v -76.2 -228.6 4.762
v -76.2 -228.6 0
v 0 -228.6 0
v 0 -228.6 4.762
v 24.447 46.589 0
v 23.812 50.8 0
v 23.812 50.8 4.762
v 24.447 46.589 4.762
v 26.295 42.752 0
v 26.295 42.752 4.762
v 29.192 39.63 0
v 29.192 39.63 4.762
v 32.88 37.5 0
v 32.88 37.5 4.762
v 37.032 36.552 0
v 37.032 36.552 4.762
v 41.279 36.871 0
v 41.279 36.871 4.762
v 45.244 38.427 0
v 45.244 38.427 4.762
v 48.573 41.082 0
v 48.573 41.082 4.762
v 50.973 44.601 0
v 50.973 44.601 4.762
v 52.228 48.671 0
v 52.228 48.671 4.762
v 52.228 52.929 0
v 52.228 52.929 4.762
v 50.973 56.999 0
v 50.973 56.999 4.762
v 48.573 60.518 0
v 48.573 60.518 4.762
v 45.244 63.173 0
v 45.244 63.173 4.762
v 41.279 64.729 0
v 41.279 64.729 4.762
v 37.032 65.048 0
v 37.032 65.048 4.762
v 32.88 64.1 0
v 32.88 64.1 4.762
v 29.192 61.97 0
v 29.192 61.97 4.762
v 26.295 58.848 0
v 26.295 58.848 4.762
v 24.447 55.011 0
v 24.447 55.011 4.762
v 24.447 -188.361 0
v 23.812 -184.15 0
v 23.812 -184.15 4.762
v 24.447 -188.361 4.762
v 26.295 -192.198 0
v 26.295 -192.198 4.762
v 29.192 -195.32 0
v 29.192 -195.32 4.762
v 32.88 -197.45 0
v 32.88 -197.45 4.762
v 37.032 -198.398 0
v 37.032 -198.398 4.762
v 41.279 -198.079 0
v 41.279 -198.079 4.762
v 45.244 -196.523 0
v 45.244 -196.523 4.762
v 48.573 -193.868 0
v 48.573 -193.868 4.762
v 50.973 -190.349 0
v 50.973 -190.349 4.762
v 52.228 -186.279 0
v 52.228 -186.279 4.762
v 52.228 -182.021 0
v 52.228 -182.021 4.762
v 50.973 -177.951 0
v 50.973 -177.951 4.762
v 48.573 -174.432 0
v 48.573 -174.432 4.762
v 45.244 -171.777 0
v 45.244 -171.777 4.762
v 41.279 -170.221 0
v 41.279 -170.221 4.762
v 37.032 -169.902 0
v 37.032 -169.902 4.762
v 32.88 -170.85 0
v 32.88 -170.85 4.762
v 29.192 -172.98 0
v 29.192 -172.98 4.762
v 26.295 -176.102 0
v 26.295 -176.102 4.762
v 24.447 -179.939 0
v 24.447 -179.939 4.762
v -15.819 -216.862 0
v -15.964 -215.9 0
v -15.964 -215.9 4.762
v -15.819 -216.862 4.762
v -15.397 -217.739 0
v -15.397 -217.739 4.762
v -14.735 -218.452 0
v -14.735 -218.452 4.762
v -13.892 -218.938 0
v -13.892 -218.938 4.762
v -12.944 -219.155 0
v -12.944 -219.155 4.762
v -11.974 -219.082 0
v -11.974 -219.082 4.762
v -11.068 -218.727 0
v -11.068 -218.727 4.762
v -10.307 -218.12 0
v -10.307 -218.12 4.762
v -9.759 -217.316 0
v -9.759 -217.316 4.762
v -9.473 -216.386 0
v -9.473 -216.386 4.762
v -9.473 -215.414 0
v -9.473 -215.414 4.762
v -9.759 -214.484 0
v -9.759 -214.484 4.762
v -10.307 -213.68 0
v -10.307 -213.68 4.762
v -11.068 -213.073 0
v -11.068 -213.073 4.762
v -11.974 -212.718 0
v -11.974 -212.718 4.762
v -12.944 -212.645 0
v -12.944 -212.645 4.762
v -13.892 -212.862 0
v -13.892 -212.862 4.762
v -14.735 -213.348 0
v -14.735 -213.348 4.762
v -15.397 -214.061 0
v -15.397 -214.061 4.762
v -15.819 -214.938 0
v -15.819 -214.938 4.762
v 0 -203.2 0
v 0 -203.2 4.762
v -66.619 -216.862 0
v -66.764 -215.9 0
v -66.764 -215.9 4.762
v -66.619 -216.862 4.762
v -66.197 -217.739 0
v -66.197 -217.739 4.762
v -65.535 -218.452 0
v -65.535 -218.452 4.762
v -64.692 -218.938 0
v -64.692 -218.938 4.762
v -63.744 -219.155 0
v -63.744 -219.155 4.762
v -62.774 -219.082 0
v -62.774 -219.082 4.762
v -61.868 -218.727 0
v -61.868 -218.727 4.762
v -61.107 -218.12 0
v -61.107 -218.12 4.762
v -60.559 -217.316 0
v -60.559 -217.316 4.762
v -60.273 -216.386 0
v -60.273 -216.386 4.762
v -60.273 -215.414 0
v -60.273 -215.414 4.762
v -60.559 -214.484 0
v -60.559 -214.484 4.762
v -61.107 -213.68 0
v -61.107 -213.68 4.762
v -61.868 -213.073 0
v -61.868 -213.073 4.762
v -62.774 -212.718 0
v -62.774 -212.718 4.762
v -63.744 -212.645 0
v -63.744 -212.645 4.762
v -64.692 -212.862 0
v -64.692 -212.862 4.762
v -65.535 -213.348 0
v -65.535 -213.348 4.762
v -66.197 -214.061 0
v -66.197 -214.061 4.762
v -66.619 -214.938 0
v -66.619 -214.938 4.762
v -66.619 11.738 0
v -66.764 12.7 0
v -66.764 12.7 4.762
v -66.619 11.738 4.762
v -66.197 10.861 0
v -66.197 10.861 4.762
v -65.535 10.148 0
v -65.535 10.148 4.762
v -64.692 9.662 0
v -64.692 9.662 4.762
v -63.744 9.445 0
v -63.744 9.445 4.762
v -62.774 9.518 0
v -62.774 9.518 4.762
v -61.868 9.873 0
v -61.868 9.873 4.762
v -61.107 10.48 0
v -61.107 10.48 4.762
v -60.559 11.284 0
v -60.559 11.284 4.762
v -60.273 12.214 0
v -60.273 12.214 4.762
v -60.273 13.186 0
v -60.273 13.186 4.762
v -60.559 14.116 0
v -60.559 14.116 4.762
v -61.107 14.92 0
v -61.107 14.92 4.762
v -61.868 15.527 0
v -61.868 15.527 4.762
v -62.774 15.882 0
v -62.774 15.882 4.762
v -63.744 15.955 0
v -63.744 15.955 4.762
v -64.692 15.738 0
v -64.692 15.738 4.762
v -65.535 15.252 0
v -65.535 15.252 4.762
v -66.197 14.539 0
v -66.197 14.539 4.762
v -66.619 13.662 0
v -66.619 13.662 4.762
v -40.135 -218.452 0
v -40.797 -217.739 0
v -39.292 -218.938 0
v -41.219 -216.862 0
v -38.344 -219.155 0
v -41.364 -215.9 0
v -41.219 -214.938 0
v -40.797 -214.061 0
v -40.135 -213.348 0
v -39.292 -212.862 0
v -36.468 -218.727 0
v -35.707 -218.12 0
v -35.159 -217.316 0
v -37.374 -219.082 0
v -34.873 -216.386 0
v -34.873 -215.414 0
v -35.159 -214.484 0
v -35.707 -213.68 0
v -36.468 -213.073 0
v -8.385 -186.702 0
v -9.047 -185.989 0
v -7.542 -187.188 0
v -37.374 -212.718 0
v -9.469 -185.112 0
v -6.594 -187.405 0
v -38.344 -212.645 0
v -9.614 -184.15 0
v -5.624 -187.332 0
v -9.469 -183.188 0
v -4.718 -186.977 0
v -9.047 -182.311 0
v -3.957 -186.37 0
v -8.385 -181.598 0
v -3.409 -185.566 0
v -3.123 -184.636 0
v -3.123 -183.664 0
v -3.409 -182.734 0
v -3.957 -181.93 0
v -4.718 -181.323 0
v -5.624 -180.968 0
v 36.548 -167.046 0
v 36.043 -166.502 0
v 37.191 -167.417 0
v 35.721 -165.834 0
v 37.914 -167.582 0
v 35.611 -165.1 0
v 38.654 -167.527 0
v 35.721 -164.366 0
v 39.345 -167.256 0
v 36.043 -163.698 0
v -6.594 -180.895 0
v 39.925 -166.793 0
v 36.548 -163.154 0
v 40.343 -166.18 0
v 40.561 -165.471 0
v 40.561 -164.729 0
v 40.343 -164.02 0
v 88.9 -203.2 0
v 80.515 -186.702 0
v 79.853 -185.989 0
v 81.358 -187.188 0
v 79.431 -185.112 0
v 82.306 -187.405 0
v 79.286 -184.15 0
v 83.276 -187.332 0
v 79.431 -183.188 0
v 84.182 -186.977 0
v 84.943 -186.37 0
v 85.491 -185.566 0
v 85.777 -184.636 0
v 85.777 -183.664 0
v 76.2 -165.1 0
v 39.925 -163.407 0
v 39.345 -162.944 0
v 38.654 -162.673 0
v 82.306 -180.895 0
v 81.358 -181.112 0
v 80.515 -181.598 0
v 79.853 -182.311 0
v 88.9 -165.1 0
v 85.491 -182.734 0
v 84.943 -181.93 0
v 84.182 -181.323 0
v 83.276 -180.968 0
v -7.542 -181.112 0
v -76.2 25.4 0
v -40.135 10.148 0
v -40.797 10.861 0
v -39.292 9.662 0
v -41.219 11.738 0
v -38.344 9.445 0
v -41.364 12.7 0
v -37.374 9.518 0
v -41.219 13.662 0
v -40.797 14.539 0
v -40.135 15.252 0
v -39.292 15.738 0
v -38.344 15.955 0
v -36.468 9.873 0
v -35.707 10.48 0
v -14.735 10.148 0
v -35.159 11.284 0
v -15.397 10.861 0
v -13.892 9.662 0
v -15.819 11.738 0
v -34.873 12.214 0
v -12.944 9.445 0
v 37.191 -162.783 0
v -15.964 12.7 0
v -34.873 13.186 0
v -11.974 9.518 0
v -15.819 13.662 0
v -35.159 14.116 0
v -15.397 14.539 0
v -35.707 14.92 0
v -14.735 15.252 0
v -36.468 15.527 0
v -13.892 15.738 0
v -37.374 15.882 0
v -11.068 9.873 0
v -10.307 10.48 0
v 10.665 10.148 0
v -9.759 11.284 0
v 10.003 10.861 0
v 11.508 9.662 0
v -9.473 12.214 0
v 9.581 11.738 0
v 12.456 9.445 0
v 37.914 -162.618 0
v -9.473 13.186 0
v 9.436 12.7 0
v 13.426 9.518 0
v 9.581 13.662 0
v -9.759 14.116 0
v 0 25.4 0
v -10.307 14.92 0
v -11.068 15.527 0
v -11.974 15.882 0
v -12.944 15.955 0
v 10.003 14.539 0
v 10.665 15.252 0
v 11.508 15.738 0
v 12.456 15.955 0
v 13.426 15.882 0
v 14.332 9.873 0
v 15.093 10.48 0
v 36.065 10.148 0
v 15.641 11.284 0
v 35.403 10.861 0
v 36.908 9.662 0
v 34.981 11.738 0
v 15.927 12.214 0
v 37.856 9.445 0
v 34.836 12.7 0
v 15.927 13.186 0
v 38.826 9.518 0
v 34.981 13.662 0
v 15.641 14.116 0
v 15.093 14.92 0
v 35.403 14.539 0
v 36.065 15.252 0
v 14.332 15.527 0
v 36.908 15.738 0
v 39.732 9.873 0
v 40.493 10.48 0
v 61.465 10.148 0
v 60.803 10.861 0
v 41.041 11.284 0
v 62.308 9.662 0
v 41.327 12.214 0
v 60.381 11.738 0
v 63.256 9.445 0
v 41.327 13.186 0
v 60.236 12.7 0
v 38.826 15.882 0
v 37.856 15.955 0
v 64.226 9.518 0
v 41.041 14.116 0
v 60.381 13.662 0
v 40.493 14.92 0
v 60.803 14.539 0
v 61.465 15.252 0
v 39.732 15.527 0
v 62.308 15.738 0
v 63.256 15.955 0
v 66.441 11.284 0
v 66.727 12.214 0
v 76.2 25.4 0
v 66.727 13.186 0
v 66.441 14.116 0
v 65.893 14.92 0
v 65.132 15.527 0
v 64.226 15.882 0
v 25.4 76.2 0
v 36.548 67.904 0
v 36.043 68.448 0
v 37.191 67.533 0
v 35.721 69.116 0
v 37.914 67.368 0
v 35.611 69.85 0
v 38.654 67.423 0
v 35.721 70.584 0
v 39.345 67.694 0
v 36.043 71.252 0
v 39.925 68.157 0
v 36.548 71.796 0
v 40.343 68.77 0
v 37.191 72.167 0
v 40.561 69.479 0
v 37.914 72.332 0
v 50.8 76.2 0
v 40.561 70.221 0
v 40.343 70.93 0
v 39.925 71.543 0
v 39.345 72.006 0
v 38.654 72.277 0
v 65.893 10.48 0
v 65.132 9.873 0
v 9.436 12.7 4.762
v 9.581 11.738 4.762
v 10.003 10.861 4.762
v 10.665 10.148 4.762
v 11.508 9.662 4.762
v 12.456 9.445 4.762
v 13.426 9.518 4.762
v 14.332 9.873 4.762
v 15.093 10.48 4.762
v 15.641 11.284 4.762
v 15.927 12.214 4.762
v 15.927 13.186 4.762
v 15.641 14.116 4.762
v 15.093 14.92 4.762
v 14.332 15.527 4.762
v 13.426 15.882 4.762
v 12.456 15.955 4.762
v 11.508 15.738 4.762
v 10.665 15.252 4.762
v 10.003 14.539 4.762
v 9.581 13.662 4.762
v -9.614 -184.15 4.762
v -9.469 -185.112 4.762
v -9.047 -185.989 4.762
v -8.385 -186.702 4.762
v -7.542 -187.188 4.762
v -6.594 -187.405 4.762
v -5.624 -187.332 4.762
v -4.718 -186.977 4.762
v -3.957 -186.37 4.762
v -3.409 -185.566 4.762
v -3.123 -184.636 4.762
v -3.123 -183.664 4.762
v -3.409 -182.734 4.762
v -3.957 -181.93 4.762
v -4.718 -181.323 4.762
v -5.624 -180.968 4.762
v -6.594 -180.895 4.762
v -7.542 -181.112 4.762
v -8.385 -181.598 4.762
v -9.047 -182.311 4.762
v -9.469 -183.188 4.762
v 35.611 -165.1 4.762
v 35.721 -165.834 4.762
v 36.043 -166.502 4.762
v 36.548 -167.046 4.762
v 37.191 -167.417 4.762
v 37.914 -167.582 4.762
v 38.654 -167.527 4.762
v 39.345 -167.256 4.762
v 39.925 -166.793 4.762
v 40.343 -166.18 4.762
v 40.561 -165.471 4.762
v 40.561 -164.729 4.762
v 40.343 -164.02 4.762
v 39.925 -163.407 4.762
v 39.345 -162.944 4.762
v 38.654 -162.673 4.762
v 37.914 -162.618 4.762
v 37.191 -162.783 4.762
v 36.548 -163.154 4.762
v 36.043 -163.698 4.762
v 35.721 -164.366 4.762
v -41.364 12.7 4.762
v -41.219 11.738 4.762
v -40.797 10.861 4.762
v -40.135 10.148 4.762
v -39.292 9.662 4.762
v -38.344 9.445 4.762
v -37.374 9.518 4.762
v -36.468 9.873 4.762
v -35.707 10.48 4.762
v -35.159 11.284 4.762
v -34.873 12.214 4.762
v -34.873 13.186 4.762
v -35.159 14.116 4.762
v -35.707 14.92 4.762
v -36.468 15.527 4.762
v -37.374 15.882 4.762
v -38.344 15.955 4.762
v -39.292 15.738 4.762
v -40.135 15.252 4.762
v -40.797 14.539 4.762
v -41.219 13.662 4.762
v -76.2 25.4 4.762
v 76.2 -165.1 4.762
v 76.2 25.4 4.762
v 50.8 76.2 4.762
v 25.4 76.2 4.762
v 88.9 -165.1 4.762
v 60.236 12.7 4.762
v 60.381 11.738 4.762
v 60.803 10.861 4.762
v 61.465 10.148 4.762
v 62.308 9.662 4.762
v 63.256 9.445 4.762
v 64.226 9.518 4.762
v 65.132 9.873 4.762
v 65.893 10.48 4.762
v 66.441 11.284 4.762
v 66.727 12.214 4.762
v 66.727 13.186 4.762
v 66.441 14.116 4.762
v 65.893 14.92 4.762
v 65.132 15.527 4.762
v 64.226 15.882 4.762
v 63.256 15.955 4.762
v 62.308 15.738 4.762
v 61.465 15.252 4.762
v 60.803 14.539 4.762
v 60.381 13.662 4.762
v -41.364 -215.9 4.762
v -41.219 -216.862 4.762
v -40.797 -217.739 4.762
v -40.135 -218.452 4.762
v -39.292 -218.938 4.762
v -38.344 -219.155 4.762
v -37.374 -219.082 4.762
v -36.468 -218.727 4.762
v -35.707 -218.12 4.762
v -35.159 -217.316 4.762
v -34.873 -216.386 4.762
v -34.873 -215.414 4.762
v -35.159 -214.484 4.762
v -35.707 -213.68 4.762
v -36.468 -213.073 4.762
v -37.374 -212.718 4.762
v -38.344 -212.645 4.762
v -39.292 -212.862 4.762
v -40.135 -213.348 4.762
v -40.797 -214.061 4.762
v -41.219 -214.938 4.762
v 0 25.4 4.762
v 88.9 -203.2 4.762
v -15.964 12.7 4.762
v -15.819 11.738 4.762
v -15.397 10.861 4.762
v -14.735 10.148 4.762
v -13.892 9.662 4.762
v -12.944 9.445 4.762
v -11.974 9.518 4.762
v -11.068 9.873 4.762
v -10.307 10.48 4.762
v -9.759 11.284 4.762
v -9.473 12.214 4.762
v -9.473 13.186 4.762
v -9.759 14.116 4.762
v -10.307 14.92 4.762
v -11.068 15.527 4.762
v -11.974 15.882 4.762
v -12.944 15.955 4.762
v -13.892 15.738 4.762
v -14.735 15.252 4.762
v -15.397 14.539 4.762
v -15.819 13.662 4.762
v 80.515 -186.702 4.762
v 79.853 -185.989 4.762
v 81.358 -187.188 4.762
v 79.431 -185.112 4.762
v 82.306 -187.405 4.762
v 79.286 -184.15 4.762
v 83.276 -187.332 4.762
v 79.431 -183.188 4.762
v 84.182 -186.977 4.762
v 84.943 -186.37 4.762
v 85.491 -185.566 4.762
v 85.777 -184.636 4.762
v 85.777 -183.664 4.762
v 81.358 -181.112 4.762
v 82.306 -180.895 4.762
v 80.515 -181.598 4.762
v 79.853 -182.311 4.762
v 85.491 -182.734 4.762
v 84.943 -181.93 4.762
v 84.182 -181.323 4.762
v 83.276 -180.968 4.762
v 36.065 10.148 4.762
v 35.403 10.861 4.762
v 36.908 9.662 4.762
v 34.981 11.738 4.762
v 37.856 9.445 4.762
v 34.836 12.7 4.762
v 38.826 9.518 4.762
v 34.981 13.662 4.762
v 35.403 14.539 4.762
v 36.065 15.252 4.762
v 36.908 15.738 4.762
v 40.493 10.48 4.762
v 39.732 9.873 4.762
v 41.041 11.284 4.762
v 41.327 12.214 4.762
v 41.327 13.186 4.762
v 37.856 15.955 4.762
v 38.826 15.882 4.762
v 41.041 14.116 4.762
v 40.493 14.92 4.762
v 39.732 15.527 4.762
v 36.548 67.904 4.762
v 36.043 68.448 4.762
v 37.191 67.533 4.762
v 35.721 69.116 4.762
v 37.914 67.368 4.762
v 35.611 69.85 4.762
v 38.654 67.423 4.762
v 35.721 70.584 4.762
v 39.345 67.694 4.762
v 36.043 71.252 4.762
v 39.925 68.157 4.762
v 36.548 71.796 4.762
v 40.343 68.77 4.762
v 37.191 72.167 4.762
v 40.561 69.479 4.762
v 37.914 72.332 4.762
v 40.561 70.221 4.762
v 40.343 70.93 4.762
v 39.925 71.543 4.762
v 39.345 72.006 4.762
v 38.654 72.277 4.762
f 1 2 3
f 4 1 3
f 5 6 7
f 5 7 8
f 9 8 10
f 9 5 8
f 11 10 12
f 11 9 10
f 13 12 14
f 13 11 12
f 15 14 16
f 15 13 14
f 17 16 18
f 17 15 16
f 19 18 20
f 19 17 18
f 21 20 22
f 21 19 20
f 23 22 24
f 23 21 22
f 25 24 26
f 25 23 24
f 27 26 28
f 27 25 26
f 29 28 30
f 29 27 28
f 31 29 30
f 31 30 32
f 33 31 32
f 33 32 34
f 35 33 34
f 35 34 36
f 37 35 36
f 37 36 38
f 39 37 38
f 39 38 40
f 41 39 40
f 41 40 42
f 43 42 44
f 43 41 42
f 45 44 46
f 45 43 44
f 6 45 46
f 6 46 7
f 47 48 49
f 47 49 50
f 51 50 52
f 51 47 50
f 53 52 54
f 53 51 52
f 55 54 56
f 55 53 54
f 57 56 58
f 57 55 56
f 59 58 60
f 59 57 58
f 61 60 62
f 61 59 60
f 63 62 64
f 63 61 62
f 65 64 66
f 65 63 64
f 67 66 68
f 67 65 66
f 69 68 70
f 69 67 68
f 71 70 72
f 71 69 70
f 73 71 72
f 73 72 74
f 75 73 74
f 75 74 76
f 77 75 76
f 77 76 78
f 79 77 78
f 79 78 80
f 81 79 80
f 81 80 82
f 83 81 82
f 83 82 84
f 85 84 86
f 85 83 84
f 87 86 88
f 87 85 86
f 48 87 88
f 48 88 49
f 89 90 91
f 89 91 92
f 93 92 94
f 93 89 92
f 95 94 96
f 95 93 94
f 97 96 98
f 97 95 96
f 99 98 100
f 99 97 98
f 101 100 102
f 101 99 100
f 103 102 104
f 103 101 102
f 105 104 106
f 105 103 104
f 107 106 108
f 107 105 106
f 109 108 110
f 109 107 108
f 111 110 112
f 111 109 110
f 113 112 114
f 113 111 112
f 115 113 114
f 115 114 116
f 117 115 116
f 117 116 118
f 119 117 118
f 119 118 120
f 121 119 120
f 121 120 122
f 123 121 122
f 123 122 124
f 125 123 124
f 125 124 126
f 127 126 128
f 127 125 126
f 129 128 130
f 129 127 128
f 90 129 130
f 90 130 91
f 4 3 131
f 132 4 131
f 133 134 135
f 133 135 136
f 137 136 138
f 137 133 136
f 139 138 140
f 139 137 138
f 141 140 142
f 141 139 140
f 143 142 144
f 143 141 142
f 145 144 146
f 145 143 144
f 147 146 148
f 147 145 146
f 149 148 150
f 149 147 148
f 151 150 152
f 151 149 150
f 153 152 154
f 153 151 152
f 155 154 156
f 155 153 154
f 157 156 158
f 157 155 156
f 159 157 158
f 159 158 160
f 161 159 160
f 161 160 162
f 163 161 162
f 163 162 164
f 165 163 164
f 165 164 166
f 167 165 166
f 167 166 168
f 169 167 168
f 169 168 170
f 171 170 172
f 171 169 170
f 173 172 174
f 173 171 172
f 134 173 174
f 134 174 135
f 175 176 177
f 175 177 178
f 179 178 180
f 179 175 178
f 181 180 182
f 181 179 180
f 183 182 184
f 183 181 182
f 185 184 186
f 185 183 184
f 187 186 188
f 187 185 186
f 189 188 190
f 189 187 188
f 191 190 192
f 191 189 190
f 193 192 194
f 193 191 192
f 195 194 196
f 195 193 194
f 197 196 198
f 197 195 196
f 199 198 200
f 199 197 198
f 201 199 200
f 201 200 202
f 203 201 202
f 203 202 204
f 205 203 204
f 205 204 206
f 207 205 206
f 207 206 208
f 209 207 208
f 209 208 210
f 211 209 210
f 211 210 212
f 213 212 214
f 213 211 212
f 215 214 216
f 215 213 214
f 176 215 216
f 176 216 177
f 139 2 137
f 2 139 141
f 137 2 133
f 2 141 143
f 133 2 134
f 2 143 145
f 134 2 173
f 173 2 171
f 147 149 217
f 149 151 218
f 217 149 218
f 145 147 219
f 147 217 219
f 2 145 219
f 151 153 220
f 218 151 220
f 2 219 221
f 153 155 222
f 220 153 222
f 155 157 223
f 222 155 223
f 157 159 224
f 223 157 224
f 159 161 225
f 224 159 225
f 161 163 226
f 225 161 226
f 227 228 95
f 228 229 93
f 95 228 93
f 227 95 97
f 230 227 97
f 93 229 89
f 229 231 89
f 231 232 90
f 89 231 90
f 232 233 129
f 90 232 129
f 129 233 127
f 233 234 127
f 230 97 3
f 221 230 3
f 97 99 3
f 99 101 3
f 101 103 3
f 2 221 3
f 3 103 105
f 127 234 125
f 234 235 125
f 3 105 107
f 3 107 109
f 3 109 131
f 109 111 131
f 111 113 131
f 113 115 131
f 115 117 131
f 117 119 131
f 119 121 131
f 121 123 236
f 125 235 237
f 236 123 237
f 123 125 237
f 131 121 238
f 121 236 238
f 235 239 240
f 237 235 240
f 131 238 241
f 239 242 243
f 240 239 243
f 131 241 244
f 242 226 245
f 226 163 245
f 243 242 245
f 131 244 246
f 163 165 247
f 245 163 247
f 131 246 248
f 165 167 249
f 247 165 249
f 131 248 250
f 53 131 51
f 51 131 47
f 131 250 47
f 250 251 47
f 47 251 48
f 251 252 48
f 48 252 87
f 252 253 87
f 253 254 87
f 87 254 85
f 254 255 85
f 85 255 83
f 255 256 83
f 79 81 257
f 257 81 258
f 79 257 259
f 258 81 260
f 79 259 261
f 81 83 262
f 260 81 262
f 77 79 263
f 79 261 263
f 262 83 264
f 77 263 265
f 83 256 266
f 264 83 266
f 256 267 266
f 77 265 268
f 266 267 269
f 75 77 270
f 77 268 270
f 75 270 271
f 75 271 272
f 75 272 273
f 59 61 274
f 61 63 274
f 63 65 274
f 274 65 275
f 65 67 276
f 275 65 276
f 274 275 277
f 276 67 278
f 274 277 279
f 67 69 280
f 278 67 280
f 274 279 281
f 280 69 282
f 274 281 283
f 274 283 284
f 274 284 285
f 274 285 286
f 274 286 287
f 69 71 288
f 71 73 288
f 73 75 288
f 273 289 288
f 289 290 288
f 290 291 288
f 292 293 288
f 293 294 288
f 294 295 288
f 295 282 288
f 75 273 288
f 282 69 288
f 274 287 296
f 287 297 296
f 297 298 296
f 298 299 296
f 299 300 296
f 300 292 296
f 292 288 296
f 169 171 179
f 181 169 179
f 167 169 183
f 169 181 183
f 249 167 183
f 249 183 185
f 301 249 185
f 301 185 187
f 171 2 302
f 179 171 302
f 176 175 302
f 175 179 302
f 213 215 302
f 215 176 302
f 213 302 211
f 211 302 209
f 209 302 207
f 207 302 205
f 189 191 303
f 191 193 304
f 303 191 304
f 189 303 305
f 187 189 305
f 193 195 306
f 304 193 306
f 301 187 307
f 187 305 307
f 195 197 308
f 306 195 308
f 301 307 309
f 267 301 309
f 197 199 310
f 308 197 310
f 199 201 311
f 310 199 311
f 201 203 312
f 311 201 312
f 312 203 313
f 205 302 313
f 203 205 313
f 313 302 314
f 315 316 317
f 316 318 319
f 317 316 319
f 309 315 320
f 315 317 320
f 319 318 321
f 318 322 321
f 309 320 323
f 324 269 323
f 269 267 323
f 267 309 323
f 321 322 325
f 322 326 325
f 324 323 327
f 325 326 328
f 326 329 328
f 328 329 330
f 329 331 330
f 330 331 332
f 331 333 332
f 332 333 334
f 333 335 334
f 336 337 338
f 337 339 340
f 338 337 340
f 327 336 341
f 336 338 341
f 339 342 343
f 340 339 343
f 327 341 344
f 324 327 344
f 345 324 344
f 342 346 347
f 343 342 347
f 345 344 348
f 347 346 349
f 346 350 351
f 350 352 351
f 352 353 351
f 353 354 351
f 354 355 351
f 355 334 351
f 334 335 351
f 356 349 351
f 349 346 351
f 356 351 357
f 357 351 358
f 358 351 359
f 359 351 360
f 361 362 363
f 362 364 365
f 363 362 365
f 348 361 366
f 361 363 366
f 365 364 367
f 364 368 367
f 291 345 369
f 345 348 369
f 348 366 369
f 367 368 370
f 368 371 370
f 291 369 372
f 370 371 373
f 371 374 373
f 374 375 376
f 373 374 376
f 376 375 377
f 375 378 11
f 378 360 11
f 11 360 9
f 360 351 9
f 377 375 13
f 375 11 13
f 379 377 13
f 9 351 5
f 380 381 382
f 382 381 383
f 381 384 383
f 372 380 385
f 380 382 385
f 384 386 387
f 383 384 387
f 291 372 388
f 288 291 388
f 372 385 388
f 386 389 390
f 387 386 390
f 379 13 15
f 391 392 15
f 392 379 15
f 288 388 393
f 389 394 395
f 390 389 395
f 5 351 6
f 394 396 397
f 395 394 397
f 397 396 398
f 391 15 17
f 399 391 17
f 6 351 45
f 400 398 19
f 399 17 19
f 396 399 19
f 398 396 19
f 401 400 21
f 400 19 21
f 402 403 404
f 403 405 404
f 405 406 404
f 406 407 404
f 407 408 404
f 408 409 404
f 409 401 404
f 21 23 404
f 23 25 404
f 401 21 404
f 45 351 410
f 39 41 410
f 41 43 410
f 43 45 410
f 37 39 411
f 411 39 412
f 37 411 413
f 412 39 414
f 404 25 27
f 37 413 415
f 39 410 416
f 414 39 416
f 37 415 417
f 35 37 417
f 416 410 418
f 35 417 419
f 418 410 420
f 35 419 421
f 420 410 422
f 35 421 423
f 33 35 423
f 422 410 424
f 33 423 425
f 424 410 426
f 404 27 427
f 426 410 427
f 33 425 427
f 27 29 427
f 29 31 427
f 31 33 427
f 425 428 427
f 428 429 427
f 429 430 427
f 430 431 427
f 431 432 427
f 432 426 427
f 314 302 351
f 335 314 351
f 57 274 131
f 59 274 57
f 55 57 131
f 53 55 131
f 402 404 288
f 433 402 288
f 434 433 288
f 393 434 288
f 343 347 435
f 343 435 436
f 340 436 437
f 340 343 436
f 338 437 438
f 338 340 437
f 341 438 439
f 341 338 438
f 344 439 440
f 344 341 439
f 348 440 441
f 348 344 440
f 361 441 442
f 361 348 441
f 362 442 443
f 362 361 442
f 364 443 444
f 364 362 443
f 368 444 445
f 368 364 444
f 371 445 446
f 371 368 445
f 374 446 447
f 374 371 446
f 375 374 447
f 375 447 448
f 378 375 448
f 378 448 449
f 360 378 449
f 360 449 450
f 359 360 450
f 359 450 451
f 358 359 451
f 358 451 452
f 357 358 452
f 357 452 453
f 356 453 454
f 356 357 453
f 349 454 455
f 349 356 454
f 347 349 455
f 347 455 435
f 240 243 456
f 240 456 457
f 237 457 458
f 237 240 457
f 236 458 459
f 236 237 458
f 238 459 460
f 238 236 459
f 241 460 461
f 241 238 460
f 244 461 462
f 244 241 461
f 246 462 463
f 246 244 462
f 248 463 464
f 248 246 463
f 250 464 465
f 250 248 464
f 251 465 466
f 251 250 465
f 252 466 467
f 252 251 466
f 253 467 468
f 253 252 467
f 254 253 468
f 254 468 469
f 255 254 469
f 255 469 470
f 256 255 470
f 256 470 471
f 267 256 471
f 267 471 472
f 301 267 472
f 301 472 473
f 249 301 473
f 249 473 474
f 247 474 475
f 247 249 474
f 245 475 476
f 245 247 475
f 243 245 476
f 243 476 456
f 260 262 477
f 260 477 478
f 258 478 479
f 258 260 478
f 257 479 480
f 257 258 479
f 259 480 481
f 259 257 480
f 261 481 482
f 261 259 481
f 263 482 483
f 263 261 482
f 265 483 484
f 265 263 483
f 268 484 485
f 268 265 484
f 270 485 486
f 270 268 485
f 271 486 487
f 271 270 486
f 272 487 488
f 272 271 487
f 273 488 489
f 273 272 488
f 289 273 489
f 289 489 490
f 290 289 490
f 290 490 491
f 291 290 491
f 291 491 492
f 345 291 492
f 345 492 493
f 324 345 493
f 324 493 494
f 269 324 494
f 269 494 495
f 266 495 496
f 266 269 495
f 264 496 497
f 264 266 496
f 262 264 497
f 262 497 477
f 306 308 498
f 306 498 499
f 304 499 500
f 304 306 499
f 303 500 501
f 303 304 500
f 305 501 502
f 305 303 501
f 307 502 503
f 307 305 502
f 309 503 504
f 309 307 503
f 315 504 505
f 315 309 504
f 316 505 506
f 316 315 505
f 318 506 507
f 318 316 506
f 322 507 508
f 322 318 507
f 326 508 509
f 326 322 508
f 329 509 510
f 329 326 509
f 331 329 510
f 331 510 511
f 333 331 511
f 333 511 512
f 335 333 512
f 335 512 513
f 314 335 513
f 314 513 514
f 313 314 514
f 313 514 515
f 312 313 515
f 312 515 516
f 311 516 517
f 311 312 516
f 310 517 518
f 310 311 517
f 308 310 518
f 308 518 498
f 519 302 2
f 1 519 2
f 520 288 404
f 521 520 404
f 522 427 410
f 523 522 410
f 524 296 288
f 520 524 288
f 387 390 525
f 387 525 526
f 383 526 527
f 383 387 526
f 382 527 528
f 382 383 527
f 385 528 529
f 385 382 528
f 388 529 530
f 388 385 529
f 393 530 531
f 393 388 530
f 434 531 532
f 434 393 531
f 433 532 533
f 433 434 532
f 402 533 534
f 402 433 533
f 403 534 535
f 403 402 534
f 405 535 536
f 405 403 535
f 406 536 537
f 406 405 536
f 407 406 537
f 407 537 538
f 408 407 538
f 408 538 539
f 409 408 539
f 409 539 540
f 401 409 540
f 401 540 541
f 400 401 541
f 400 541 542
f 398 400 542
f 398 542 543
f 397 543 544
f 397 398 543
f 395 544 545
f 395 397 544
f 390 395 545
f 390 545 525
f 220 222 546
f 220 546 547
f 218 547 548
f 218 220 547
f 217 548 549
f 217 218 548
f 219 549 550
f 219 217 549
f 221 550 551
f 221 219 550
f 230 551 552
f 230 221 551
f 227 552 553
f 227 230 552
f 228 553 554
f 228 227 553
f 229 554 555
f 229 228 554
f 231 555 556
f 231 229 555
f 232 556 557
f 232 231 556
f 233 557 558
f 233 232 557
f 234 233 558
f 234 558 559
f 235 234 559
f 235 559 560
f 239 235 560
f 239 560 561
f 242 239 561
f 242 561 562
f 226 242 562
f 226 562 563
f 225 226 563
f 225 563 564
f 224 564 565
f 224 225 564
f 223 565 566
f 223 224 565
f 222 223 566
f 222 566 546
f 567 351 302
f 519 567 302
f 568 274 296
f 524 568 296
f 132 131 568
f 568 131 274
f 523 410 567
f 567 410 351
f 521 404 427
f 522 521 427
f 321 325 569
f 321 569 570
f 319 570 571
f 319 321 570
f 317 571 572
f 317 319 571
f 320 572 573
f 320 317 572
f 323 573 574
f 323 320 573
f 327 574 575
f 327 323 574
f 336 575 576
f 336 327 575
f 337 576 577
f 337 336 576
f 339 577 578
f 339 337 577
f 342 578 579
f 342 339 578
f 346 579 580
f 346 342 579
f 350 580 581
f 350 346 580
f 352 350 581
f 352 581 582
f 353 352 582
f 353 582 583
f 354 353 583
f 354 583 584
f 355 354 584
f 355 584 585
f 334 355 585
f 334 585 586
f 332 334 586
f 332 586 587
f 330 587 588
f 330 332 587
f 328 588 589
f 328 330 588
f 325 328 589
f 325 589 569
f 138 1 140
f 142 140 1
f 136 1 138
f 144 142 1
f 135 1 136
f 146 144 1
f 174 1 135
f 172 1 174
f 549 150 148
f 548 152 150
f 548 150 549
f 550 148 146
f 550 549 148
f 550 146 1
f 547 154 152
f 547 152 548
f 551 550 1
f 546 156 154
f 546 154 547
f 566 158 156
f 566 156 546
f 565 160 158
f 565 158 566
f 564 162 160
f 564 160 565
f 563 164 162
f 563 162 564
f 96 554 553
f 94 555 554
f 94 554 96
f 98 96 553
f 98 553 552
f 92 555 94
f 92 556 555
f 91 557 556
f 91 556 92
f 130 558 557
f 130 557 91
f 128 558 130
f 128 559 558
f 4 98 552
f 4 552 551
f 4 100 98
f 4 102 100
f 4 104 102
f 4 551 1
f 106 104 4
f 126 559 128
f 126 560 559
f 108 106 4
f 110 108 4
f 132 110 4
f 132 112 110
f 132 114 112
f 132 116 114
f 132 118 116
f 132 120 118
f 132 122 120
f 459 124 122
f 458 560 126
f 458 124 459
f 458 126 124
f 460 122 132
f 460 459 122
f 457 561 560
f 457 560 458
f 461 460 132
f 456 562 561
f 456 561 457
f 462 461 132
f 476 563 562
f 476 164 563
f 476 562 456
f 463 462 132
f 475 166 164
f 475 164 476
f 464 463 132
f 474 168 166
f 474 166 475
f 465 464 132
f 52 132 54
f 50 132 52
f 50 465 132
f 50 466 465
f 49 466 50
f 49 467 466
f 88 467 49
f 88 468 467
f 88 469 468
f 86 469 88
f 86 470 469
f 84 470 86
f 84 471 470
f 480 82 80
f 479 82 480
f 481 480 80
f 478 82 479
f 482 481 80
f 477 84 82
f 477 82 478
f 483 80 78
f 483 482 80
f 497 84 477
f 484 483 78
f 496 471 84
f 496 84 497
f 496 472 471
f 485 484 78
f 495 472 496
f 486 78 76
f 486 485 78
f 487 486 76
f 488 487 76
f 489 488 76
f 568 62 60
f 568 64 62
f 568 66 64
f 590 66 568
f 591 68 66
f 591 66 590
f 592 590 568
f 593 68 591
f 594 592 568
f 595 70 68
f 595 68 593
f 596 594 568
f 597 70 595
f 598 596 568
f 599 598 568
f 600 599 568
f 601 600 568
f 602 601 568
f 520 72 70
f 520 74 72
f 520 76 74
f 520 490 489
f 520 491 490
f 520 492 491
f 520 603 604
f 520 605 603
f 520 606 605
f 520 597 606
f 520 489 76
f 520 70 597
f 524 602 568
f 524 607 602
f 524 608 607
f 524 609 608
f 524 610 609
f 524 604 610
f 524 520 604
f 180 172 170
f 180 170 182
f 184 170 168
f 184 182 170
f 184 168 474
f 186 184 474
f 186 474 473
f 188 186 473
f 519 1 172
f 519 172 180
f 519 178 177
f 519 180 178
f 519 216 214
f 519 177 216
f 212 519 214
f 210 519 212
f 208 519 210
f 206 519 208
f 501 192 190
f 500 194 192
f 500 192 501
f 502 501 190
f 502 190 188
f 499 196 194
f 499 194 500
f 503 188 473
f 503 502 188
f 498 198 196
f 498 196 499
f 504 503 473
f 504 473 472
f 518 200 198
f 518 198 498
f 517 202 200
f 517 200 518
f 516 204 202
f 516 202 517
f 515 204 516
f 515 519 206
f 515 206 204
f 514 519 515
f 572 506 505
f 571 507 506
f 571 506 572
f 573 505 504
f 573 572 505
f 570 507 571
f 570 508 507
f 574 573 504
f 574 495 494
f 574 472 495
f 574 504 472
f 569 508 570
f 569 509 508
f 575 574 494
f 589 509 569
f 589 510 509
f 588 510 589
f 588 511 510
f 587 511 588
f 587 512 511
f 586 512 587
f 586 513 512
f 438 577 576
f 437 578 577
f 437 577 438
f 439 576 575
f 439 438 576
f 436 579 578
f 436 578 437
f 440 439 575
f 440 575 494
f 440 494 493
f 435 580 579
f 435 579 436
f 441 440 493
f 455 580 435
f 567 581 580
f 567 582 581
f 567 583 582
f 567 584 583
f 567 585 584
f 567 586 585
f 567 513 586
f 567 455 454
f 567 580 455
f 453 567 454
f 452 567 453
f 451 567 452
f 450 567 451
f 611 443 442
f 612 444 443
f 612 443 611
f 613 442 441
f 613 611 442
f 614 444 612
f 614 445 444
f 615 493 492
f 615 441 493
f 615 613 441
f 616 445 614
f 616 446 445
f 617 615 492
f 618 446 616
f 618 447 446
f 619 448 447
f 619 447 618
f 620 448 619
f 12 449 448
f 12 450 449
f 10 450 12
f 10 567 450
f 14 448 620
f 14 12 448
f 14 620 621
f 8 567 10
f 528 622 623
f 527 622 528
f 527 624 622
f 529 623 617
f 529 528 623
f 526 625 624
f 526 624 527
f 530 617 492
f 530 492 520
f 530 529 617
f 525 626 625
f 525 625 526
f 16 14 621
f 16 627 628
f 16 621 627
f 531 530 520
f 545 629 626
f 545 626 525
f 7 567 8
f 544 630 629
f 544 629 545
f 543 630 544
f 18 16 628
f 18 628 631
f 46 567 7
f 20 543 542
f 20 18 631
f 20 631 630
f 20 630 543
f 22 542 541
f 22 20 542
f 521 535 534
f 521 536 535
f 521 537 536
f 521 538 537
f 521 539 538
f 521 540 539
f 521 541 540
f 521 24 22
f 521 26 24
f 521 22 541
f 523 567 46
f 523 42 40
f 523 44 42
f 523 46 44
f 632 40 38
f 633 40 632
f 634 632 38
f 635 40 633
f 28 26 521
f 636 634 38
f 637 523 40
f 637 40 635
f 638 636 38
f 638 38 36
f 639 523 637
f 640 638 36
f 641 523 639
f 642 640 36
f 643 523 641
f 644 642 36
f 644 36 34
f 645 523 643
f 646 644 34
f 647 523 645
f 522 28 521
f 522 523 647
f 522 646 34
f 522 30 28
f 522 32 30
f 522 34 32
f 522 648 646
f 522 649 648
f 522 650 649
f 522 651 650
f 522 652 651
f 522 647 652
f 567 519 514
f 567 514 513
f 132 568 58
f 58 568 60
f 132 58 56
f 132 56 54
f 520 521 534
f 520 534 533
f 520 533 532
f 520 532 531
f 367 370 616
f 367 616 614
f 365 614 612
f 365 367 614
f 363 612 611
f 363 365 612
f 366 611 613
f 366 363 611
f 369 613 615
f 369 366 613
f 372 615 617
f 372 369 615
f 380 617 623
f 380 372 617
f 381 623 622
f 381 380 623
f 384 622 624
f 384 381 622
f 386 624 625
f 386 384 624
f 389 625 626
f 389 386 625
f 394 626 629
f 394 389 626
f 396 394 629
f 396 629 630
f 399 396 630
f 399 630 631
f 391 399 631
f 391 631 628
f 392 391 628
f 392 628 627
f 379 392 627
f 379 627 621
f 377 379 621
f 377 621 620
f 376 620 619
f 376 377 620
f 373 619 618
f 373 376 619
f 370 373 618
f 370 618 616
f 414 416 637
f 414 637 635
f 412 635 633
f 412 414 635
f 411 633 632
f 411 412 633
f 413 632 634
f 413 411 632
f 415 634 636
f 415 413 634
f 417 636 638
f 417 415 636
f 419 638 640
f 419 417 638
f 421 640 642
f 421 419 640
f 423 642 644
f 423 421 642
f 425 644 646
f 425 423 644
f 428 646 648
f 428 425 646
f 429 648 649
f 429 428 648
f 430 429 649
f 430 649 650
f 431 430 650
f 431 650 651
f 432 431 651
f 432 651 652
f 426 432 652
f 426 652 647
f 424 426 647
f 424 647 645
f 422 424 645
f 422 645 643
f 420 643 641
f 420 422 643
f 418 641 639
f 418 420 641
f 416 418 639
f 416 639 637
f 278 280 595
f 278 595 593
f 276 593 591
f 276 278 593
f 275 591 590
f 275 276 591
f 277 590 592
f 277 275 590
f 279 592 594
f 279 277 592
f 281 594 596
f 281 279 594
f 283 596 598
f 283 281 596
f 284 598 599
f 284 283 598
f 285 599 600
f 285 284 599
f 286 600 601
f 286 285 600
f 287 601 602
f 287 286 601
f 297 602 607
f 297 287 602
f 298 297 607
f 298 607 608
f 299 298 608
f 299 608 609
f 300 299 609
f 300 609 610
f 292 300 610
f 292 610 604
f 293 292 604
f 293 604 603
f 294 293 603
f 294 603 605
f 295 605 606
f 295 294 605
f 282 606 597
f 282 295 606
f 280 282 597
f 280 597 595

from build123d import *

# Parameters (mm, degrees)
SKETCH1_R           = 3.2639
SKETCH1_R_2         = 14.2875
SKETCH1_R_3         = 2.4892
BOSS_EXTRUDE1_DEPTH = 4.7625


with BuildPart() as part:
    # Sketch1 → Boss-Extrude1 (new body)
    with BuildSketch(Plane.XY):
        Polygon((76.2, 0), (76.2, 25.4), (50.8, 76.2), (25.4, 76.2), (0, 25.4), (-76.2, 25.4), (-76.2, 0), (-76.2, -215.9), (-76.2, -228.6), (0, -228.6), (0, -203.2), (38.1, -203.2), (88.9, -203.2), (88.9, -165.1), (76.2, -165.1), align=None)
        with Locations(Location((-38.1, 12.7, 0), (0, 0, 180))):
            Circle(SKETCH1_R, mode=Mode.SUBTRACT)
        with Locations(Location((-12.7, 12.7, 0), (0, 0, 180))):
            Circle(SKETCH1_R, mode=Mode.SUBTRACT)
        with Locations(Location((-63.5, 12.7, 0), (0, 0, 180))):
            Circle(SKETCH1_R, mode=Mode.SUBTRACT)
        with Locations(Location((12.7, 12.7, 0), (0, 0, 180))):
            Circle(SKETCH1_R, mode=Mode.SUBTRACT)
        with Locations(Location((38.1, 12.7, 0), (0, 0, 180))):
            Circle(SKETCH1_R, mode=Mode.SUBTRACT)
        with Locations(Location((38.1, 50.8, 0), (0, 0, 180))):
            Circle(SKETCH1_R_2, mode=Mode.SUBTRACT)
        with Locations(Location((63.5, 12.7, 0), (0, 0, 180))):
            Circle(SKETCH1_R, mode=Mode.SUBTRACT)
        with Locations(Location((38.1, -184.15, 0), (0, 0, 180))):
            Circle(SKETCH1_R_2, mode=Mode.SUBTRACT)
        with Locations(Location((38.1, -165.1, 0), (0, 0, 180))):
            Circle(SKETCH1_R_3, mode=Mode.SUBTRACT)
        with Locations(Location((-12.7, -215.9, 0), (0, 0, 180))):
            Circle(SKETCH1_R, mode=Mode.SUBTRACT)
        with Locations(Location((-38.1, -215.9, 0), (0, 0, 180))):
            Circle(SKETCH1_R, mode=Mode.SUBTRACT)
        with Locations(Location((-63.5, -215.9, 0), (0, 0, 180))):
            Circle(SKETCH1_R, mode=Mode.SUBTRACT)
        with Locations(Location((38.1, 69.85, 0), (0, 0, 180))):
            Circle(SKETCH1_R_3, mode=Mode.SUBTRACT)
        with Locations(Location((82.55, -184.15, 0), (0, 0, 180))):
            Circle(SKETCH1_R, mode=Mode.SUBTRACT)
        with Locations(Location((-6.35, -184.15, 0), (0, 0, 180))):
            Circle(SKETCH1_R, mode=Mode.SUBTRACT)
    extrude(amount=BOSS_EXTRUDE1_DEPTH)


solid = part.part
